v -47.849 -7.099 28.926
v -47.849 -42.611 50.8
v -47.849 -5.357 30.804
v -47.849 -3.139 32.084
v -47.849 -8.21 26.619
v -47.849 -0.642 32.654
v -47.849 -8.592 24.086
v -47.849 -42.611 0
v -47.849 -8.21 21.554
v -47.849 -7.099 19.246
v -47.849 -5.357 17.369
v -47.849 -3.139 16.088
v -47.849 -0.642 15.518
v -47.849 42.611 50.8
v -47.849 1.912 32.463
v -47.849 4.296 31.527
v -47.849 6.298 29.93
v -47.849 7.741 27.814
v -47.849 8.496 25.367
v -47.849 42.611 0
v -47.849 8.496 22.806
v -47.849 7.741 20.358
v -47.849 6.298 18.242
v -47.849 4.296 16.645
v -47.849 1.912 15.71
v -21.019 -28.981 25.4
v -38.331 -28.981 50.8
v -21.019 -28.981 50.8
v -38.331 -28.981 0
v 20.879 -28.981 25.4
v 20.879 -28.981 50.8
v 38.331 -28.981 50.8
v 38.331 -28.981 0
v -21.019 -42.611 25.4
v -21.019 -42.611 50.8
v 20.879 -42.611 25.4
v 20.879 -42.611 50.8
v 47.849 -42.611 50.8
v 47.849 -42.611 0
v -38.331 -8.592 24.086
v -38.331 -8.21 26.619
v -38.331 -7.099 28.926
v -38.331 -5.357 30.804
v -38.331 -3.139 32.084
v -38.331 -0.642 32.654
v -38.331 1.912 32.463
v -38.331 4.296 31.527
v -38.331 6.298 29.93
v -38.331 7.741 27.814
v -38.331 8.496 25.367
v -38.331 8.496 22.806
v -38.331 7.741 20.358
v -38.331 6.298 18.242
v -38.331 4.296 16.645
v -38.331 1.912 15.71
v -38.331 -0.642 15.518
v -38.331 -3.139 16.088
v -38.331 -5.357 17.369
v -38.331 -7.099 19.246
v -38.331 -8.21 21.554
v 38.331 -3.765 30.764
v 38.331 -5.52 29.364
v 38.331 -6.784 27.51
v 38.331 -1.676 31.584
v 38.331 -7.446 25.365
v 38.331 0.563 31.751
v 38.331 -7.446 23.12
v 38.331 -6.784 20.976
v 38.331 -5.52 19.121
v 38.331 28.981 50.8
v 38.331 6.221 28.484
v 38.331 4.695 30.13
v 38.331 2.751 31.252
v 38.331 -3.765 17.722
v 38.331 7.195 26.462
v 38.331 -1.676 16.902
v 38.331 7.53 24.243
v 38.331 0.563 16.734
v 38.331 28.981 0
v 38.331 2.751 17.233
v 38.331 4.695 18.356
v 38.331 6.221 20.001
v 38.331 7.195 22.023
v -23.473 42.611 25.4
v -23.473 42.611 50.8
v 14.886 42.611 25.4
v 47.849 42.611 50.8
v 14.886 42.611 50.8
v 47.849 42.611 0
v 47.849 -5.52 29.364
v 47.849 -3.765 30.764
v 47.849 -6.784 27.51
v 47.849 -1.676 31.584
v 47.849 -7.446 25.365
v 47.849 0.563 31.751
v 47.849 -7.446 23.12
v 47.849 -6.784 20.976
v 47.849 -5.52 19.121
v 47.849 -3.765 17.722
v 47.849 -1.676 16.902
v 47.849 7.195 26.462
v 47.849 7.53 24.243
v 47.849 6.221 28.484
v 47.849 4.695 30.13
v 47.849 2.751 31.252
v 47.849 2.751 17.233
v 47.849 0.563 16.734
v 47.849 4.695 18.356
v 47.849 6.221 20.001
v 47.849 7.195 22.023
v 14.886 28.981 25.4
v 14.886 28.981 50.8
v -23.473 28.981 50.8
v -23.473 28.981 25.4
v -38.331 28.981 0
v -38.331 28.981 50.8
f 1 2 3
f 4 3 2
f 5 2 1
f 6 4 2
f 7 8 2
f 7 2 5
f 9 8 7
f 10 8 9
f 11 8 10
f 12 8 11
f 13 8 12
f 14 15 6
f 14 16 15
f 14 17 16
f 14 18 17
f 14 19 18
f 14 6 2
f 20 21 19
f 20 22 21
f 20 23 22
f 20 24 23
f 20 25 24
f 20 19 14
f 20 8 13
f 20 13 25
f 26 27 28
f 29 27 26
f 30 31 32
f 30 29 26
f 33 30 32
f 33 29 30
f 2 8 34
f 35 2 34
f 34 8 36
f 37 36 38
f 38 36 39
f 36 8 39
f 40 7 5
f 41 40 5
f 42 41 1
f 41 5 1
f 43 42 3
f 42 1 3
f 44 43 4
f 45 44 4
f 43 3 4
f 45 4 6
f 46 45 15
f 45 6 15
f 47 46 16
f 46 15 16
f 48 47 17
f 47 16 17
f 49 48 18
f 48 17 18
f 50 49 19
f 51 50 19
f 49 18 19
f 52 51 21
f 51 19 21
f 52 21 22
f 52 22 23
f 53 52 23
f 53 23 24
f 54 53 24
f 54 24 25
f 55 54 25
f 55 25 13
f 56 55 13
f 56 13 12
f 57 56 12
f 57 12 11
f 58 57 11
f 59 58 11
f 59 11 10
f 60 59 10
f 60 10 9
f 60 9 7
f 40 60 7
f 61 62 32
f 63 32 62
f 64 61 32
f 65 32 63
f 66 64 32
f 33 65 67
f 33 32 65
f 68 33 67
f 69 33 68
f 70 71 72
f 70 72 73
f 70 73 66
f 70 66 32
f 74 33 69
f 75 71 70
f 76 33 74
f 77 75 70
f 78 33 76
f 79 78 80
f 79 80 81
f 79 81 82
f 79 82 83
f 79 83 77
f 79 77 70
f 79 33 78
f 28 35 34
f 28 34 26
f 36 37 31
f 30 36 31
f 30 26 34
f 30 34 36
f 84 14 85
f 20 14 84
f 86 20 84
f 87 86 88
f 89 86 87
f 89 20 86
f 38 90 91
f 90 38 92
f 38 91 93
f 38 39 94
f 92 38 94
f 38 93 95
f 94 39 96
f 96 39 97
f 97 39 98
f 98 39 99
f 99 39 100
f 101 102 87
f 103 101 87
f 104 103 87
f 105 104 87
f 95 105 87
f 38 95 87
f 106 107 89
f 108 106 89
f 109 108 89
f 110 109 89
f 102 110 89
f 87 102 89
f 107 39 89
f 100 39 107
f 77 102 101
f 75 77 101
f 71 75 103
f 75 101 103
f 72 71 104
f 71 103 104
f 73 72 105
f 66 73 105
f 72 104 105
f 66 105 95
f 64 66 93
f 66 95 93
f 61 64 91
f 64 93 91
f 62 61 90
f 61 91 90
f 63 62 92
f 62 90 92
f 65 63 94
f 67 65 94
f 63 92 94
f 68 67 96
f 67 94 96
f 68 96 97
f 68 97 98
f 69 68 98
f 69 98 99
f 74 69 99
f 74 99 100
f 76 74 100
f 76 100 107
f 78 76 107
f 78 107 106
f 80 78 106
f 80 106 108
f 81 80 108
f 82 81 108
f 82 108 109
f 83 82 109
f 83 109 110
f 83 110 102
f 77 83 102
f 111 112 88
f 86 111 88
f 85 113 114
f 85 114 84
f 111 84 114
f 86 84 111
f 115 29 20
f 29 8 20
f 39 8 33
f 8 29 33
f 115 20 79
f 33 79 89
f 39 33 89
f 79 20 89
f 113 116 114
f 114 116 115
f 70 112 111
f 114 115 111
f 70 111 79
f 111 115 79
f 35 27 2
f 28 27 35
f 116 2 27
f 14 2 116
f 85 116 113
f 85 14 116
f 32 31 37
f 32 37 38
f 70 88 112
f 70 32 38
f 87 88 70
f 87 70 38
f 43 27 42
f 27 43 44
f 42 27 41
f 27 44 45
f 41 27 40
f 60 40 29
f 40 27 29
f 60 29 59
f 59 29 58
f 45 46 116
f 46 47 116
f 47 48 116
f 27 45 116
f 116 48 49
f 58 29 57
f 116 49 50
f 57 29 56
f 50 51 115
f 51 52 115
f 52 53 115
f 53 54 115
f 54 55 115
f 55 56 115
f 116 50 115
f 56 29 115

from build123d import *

# Parameters (mm, degrees)
F0_W      = 95.6981405616
F0_H      = 85.2225497365
F0_W_2    = 76.6617953777
F0_H_2    = 57.9620860517
F1_DEPTH  = 50.8
F2_W      = 41.8984405696
F2_H      = 13.6302318424
F4_DEPTH  = 25.4
F5_W      = 38.359541446
F5_H      = 13.6302318424
F6_DEPTH  = 25.4
F7_R      = 7.5298291719
F8_DEPTH  = 38.1
F9_R      = 7.8998800408
F10_DEPTH = 38.1
F11_R     = 8.5919528165
F12_DEPTH = 25.4


with BuildPart() as f1:
    # F0 (on Top) → F1 (new body)
    with BuildSketch(Plane.XY):
        Rectangle(F0_W, F0_H)
        Rectangle(F0_W_2, F0_H_2, mode=Mode.SUBTRACT)
    extrude(amount=F1_DEPTH)

    # F2 (on face) → F4 (cut)
    with BuildSketch(Plane.XY.offset(50.8)):
        with Locations((-0.0701360404, -35.7961589471)):
            Rectangle(F2_W, F2_H)
    extrude(amount=-F4_DEPTH, mode=Mode.SUBTRACT)

    # F5 (on face) → F6 (cut)
    with BuildSketch(Plane.XY.offset(50.8)):
        with Locations((-4.2936895043, 35.7961589471)):
            Rectangle(F5_W, F5_H)
    extrude(amount=-F6_DEPTH, mode=Mode.SUBTRACT)

    # F7 (on face) → F8 (cut)
    with BuildSketch(Plane.YZ.offset(47.8490702808)):
        with Locations((0, 24.2426600307)):
            Circle(F7_R)
    extrude(amount=-F8_DEPTH, mode=Mode.SUBTRACT)

    # F9 (on face) → F10 (cut)
    with BuildSketch(Plane(origin=(-47.8490702808, 0, 0), x_dir=(0, -1, 0), z_dir=(-1, 0, 0))):
        with Locations((0, 24.427017197)):
            Circle(F9_R)
    extrude(amount=F10_DEPTH, mode=Mode.SUBTRACT)

    # F11 (on face) → F12 (cut)
    with BuildSketch(Plane(origin=(-47.8490702808, 0, 0), x_dir=(0, -1, 0), z_dir=(-1, 0, 0))):
        with Locations((0, 24.0862686187)):
            Circle(F11_R)
    extrude(amount=-F12_DEPTH, mode=Mode.SUBTRACT)


solid = f1.part
